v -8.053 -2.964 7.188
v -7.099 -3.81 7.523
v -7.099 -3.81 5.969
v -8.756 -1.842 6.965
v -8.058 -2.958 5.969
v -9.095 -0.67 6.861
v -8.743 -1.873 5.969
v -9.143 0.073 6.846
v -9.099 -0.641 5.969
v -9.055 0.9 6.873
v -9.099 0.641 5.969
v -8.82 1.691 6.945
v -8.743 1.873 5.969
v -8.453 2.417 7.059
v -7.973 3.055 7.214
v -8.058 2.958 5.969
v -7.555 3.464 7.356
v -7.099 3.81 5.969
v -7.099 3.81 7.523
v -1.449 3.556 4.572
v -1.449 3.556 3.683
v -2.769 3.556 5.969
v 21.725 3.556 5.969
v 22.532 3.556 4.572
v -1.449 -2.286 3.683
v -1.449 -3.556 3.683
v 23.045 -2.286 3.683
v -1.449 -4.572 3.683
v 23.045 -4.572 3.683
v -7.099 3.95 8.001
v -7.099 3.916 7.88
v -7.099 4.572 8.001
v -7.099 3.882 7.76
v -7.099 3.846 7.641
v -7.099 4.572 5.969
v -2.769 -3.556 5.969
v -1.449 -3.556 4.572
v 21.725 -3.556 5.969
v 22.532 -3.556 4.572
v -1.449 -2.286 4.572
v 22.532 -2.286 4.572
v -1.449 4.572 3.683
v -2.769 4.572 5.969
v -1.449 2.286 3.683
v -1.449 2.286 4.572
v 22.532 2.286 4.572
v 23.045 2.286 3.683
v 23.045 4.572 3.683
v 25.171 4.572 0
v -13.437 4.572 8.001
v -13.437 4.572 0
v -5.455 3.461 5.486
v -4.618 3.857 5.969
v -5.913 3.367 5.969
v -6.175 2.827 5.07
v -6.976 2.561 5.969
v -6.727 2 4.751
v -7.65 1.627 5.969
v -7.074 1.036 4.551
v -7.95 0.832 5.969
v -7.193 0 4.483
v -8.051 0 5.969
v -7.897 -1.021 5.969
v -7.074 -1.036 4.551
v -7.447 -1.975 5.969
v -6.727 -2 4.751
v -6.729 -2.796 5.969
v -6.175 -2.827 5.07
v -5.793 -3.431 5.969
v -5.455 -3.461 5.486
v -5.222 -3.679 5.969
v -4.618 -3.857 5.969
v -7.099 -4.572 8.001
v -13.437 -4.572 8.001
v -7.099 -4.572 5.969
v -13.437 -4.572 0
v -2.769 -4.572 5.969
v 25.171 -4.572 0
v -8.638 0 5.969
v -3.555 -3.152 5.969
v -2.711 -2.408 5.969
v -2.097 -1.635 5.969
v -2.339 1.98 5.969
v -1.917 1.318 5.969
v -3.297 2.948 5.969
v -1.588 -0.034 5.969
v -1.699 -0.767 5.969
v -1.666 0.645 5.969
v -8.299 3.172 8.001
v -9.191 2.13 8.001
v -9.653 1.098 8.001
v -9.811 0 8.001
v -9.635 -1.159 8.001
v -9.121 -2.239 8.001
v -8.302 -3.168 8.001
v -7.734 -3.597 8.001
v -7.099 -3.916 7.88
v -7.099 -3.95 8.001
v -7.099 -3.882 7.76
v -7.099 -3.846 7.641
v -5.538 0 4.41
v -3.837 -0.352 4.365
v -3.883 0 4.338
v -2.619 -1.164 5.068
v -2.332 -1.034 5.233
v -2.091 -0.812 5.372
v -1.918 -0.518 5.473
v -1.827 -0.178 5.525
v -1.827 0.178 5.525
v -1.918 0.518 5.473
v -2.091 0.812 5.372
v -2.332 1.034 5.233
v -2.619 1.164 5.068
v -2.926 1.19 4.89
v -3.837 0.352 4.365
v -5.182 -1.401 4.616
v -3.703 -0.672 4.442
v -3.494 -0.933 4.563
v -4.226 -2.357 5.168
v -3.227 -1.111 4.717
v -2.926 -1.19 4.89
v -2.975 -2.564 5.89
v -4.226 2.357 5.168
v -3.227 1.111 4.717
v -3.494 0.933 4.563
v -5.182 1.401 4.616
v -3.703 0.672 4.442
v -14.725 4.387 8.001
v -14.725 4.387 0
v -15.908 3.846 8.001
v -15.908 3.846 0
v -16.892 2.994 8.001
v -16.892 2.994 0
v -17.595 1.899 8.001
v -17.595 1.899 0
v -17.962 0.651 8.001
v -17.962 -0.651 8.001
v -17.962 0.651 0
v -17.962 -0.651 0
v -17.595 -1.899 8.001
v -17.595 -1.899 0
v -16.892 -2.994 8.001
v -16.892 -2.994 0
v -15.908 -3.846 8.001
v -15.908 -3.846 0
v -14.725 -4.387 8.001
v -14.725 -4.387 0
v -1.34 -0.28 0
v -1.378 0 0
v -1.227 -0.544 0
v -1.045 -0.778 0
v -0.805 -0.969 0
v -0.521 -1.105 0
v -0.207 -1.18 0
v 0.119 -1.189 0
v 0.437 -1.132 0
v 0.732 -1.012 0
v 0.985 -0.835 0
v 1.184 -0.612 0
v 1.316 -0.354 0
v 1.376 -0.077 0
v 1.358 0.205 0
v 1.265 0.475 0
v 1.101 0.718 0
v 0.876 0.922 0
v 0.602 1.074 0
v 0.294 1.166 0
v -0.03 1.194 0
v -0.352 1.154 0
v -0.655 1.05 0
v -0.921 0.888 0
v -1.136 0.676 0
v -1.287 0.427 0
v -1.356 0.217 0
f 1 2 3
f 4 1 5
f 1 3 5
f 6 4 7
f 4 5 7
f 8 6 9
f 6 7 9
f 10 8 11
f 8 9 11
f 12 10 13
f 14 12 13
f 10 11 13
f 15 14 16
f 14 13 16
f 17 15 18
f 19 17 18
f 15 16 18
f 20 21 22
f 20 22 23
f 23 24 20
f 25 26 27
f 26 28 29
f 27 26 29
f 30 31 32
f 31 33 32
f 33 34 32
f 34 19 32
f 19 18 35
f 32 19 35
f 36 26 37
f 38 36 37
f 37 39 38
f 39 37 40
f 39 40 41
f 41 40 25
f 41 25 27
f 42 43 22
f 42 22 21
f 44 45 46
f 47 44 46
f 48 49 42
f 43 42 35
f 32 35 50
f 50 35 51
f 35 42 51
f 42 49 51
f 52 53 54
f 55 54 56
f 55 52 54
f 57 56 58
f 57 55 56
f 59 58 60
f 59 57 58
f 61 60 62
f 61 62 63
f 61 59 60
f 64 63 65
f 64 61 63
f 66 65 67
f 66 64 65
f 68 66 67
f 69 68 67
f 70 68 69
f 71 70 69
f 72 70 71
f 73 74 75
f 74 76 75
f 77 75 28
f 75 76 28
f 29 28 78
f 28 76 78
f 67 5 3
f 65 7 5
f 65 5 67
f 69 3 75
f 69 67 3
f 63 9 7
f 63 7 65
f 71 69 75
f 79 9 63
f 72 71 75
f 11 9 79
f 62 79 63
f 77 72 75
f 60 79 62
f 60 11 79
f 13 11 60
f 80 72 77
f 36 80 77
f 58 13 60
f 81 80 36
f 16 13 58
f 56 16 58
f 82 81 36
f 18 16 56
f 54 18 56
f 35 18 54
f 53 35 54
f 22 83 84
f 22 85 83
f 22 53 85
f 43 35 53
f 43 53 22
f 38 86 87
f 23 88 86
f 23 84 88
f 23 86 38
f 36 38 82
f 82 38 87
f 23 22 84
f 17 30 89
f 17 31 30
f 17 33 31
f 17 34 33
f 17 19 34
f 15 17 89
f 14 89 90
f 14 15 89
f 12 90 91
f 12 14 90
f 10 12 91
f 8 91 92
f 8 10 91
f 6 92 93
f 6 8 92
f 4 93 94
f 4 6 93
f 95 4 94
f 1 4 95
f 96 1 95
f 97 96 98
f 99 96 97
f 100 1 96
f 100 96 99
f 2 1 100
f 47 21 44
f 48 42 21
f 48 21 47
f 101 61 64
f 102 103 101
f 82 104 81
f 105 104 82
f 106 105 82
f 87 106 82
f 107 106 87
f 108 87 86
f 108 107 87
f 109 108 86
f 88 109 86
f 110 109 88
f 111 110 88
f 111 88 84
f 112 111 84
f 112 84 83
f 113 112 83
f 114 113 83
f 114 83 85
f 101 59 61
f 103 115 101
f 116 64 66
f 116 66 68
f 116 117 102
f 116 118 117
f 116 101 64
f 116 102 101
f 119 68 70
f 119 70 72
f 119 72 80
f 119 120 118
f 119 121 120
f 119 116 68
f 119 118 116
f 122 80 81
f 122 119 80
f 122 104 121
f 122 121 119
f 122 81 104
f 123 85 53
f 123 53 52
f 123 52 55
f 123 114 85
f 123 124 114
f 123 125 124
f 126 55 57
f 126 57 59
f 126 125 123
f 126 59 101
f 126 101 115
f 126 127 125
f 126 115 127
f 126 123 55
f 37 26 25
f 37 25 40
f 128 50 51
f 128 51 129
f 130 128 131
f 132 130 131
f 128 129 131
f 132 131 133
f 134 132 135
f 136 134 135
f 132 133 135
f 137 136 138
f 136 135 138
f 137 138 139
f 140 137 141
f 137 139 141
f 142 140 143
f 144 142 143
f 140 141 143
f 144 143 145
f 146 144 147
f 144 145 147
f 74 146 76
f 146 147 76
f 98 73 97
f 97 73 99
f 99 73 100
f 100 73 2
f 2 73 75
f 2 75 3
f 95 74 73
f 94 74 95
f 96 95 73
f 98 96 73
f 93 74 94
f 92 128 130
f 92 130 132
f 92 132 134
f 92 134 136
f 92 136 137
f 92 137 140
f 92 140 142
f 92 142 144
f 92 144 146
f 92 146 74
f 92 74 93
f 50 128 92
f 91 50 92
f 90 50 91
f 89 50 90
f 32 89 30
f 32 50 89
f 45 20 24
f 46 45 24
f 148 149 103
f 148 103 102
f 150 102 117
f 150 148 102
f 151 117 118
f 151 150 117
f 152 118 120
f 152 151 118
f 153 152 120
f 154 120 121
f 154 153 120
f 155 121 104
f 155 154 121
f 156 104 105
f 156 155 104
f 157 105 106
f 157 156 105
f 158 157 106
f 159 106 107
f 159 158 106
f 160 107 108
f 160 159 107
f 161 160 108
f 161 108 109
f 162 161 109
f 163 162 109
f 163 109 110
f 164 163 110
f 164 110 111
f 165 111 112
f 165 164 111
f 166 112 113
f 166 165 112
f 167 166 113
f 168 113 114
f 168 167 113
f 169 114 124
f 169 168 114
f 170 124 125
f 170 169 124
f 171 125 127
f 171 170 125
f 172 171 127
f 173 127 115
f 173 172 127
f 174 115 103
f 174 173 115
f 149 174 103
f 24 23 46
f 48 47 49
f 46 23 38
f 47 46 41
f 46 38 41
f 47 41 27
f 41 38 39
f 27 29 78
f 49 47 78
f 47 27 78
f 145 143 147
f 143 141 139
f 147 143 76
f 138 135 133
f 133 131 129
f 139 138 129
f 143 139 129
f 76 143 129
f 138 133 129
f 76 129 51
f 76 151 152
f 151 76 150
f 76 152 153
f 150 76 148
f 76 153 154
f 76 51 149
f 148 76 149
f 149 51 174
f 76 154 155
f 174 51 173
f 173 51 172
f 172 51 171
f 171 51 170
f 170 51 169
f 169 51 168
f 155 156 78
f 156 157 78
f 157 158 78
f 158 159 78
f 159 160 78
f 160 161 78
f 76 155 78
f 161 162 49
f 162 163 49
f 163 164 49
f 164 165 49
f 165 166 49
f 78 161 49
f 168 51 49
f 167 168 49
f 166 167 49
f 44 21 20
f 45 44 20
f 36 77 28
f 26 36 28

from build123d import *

# Parameters (mm, degrees)
F1_DEPTH  = 5.969
F3_DEPTH  = 1.016
F4_W      = 26.6201772846
F4_H      = 0.889
F5_DEPTH  = 1.27
F7_DEPTH  = 9.145
F10_DEPTH = 2.032


with BuildPart() as f1:
    # F0 (on Top) → F1 (new body)
    with BuildSketch(Plane.XY):
        with BuildLine():
            Line((25.1714, 4.572), (-13.4366, 4.572))
            ThreePointArc((-13.4366, 4.572), (-18.0086, 0), (-13.4366, -4.572))
            Line((-13.4366, -4.572), (25.1714, -4.572))
            Line((25.1714, -4.572), (25.1714, 4.572))
        make_face()
    extrude(amount=F1_DEPTH)

    # F2 (on face) → F3 (cut)
    with BuildSketch(Plane.XZ.offset(4.572)):
        Polygon((-2.7686, 5.969), (-1.4487772846, 3.683), (25.1714, 3.683), (25.1714, 5.969), align=None)
    extrude(amount=-F3_DEPTH, mode=Mode.SUBTRACT)

    # F4 (on face) → F5 (cut)
    with BuildSketch(Plane.XZ.offset(3.556)):
        with Locations((11.8613113577, 4.1275)):
            Rectangle(F4_W, F4_H)
    extrude(amount=-F5_DEPTH, mode=Mode.SUBTRACT)

    # F6 (on face) → F7 (cut, through all)
    with BuildSketch(Plane.XZ.offset(4.572)):
        Polygon((21.7251962432, 5.969), (25.1714, 0), (25.1714, 5.969), align=None)
    extrude(amount=-F7_DEPTH, mode=Mode.SUBTRACT)

    # F8: F1 across plane


with BuildPart() as f1_1:
    add(f1.part)
    add(f1.part.mirror(Plane.XZ), mode=Mode.INTERSECT)

    # F9 (on face) → F10 (join)
    with BuildSketch(Plane.XY.offset(5.969)):
        with BuildLine():
            Line((-7.0992680903, 4.572), (-13.4366, 4.572))
            ThreePointArc((-13.4366, 4.572), (-18.0086, 0), (-13.4366, -4.572))
            Line((-13.4366, -4.572), (-7.0992680903, -4.572))
            Line((-7.0992680903, -4.572), (-7.0992680903, -3.81))
            ThreePointArc((-7.0992680903, -3.81), (-9.144, 0), (-7.0992680903, 3.81))
            Line((-7.0992680903, 3.81), (-7.0992680903, 4.572))
        make_face()
    extrude(amount=F10_DEPTH)

    # F11 (on Front) → F12 (revolve, cut)
    with BuildSketch(Plane.XZ):
        Polygon((1.905, -3.2995567884), (0, 0), (-7.366, 12.7582862486), (-11.2594770103, 10.5103862486), (-8.6375064372, 5.969), (-8.0509185637, 5.969), (-7.1927008583, 4.4825233303), (-3.8830387258, 4.3380203608), (0.871138873, -3.8964567884), align=None)
    revolve(axis=Axis((-3.683, 0, 6.3791431243), (-0.5, 0, 0.8660254038)), mode=Mode.SUBTRACT)


solid = f1_1.part
